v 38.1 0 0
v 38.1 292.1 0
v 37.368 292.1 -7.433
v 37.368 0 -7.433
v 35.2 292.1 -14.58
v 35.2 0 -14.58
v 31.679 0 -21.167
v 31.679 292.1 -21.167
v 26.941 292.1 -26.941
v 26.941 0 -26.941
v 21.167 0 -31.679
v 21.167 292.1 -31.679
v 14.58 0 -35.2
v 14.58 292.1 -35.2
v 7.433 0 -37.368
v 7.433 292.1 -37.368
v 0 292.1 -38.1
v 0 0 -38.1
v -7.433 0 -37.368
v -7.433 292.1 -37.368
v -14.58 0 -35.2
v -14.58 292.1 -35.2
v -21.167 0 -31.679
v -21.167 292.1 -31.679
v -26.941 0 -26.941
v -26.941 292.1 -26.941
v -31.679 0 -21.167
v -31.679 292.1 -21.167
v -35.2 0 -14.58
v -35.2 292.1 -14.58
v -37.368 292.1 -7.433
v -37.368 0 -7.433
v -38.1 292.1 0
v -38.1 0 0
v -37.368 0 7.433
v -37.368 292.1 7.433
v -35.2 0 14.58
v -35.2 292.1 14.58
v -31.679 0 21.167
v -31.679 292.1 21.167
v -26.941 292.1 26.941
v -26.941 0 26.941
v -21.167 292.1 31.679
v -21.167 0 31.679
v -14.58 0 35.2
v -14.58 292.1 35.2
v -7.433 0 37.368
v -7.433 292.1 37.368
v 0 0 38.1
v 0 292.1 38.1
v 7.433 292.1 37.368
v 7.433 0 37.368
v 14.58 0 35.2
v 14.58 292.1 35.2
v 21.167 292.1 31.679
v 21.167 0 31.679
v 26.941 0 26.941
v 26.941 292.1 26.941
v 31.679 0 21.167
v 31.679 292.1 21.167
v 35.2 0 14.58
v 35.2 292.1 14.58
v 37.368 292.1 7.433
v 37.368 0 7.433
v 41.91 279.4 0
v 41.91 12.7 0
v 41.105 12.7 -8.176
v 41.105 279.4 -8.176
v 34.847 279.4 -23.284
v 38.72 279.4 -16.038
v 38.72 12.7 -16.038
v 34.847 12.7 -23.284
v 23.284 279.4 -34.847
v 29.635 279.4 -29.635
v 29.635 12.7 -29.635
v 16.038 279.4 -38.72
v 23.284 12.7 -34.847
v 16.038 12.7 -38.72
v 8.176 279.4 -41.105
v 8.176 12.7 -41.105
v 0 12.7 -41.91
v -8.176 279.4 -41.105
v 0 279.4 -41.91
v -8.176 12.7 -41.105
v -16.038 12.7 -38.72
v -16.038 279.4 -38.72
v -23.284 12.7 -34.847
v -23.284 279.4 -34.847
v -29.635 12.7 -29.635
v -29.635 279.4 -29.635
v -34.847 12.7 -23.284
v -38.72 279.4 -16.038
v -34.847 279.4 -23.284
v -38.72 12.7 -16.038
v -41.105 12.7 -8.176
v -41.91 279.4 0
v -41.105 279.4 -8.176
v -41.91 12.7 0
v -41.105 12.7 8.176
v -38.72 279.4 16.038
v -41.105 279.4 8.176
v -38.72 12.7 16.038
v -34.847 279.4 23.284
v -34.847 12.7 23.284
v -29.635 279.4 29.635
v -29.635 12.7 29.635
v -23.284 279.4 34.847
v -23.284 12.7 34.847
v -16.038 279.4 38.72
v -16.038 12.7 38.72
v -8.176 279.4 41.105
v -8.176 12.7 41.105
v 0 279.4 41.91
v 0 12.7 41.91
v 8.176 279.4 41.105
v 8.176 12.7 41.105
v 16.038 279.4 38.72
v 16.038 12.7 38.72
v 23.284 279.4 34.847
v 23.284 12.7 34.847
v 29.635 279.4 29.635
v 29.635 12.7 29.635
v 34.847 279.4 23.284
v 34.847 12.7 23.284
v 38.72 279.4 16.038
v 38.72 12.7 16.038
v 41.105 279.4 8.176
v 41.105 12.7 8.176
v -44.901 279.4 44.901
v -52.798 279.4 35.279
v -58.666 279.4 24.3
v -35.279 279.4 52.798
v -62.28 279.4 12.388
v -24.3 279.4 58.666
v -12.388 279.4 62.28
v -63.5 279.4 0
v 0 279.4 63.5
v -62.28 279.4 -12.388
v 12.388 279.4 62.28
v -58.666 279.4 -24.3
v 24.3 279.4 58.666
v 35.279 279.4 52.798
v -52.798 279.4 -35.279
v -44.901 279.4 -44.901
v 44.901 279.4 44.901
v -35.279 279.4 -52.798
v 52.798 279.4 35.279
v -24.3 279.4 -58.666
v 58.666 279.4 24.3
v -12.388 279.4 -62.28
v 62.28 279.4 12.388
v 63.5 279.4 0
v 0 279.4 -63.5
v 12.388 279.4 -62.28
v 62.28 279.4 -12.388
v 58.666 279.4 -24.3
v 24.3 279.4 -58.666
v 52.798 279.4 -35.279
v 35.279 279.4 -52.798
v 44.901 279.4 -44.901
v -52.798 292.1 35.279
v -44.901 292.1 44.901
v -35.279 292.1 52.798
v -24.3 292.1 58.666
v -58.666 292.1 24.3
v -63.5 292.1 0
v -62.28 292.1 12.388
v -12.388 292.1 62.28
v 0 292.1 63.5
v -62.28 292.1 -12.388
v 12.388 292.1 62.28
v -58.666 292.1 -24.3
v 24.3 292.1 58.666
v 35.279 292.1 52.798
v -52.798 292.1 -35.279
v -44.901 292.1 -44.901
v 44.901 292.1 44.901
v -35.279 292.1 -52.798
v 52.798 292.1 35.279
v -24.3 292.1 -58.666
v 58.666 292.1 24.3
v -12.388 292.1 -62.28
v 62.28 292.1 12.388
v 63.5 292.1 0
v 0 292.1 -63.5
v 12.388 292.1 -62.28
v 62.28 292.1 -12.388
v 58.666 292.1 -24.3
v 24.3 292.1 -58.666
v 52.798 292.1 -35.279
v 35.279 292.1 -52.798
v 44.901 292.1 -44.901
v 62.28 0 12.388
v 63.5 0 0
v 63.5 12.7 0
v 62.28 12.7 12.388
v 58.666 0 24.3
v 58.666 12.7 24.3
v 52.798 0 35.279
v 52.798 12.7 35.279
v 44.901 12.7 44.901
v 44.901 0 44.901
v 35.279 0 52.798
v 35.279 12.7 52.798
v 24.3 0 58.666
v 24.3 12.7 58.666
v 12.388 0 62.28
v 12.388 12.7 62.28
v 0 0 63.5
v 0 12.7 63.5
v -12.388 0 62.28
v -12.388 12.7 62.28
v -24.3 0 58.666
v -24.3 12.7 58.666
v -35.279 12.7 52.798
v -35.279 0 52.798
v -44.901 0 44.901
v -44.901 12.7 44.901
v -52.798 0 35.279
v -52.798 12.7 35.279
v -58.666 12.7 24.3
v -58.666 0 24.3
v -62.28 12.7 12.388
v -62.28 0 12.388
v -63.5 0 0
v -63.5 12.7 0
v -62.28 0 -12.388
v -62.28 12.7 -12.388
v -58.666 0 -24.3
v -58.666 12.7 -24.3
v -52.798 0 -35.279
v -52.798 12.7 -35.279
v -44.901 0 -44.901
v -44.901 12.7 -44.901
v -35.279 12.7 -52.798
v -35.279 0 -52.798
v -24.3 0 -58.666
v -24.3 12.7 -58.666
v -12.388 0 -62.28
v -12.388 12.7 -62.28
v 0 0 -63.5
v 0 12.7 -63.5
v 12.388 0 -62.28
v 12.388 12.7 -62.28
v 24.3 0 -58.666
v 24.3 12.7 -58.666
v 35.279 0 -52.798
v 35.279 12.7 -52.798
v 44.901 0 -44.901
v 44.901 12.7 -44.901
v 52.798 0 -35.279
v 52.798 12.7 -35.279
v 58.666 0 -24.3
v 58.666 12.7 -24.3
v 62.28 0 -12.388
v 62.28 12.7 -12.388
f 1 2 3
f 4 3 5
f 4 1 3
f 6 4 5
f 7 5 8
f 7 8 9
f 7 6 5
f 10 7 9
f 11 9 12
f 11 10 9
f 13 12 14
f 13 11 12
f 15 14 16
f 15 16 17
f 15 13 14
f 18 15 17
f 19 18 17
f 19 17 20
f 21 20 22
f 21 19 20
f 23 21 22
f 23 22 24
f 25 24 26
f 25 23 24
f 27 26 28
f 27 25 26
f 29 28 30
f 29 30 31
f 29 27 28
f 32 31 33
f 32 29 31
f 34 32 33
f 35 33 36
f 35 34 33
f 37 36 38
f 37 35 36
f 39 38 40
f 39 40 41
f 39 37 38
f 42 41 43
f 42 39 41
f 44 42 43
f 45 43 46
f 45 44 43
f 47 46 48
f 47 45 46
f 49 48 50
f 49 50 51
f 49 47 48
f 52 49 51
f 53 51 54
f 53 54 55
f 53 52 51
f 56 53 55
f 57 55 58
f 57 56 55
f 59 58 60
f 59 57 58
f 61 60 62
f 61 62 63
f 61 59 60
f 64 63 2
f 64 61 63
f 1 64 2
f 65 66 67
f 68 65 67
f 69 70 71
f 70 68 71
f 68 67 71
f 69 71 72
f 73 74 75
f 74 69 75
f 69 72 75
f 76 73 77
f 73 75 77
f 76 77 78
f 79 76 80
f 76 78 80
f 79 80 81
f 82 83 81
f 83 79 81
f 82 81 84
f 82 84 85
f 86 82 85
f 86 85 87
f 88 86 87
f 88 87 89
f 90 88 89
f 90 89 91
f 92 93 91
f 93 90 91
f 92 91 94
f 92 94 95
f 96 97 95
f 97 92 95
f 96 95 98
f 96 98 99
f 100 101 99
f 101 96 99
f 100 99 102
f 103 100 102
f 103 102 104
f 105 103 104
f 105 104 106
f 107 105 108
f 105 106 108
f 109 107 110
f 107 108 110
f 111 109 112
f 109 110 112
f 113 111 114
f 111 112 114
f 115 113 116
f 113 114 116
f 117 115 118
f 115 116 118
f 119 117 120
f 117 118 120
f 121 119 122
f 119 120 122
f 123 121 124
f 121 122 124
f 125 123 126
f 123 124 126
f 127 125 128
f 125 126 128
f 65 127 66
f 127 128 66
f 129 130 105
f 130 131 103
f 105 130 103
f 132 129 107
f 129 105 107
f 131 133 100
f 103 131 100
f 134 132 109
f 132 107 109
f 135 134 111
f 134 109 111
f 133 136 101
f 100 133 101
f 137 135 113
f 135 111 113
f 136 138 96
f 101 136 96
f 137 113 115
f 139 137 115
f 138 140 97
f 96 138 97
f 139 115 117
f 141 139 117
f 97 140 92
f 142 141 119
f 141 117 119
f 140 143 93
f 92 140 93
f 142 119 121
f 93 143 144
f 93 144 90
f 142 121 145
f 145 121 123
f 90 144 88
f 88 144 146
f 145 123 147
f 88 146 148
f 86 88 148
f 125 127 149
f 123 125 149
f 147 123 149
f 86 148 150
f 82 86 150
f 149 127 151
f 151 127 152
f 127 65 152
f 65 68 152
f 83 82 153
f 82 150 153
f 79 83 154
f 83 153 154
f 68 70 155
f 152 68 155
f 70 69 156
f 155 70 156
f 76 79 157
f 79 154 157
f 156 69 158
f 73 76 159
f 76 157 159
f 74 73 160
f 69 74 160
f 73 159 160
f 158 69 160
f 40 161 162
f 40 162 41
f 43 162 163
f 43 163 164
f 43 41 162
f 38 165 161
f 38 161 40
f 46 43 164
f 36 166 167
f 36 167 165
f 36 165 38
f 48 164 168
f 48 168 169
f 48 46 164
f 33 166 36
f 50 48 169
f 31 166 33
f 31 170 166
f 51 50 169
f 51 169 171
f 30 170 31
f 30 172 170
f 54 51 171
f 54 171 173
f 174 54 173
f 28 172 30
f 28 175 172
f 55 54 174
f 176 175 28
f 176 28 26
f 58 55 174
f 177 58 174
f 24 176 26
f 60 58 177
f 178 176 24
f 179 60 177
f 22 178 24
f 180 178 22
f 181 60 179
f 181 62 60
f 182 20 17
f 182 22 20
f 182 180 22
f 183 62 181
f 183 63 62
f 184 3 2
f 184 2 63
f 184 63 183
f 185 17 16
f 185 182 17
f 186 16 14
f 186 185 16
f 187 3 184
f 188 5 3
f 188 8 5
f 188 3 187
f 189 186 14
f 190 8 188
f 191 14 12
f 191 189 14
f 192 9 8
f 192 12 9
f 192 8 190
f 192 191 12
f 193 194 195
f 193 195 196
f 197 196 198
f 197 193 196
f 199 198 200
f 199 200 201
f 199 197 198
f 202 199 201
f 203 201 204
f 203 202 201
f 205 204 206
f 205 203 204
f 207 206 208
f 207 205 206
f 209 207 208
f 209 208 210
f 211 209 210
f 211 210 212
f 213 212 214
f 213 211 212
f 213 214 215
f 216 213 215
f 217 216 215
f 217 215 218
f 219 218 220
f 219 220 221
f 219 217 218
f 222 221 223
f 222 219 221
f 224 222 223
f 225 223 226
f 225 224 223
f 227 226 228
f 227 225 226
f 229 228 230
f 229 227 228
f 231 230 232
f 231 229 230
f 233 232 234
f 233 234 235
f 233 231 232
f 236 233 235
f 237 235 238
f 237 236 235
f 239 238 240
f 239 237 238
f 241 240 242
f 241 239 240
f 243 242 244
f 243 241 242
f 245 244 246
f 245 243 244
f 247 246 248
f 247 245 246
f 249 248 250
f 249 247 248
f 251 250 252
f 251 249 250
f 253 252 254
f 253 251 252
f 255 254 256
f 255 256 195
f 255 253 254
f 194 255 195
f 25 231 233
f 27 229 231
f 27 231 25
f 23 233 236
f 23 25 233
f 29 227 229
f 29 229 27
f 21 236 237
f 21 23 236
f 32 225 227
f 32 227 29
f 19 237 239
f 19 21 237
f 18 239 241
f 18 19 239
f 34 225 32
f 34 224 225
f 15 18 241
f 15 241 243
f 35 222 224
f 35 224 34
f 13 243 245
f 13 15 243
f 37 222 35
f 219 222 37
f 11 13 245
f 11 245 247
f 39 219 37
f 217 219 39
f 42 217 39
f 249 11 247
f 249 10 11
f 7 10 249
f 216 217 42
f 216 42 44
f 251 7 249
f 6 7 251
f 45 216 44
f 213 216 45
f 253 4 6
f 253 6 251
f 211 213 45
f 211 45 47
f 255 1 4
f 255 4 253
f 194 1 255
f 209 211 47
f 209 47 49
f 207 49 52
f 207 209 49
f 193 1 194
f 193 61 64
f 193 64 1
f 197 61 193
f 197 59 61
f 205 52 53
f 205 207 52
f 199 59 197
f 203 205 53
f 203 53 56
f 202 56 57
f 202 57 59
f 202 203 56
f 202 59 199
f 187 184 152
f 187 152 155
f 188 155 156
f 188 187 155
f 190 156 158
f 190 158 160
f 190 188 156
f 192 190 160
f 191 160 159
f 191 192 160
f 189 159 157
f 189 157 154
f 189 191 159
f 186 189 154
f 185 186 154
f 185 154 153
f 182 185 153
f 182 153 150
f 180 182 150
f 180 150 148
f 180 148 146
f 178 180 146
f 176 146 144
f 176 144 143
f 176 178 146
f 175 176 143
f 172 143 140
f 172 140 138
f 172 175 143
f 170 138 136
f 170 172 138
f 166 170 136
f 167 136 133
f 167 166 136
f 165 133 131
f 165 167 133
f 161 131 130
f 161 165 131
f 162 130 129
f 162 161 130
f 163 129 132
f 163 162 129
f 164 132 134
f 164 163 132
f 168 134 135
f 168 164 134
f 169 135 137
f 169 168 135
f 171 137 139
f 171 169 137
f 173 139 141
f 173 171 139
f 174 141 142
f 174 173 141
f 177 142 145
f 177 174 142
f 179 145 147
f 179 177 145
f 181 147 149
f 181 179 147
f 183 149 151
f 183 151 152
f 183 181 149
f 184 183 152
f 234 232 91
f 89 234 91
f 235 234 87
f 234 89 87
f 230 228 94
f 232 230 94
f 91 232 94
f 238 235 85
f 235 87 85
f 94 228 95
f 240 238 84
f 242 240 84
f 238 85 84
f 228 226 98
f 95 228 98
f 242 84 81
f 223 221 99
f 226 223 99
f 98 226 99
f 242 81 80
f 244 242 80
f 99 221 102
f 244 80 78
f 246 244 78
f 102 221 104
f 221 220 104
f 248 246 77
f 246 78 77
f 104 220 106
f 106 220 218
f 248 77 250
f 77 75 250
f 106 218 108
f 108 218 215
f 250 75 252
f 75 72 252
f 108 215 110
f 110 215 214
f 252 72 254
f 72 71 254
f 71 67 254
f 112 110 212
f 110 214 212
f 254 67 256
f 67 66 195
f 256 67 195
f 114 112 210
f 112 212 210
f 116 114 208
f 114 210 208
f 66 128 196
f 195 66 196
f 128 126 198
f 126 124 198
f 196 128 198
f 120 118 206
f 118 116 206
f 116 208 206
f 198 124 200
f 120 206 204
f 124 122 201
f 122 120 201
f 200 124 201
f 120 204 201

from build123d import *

# Parameters (mm, degrees)
SKETCH2_R            = 41.91
SKETCH2_R_2          = 38.1
BASE_CYLINDER_DEPTH  = 292.1
SKETCH3_R            = 63.5
SKETCH3_R_2          = 38.1
AFT_FLANGE_DEPTH     = 12.7
SKETCH4_R            = 63.5
SKETCH4_R_2          = 38.1
FORWARD_FLANGE_DEPTH = 12.7


with BuildPart() as part:
    # Sketch2 → Base Cylinder (new body)
    with BuildSketch(Plane(origin=(0, 0, 0), x_dir=(1, 0, 0), z_dir=(0, 1, 0))):
        Circle(SKETCH2_R)
        Circle(SKETCH2_R_2, mode=Mode.SUBTRACT)
    extrude(amount=BASE_CYLINDER_DEPTH)

    # Sketch3 → Aft Flange (add)
    with BuildSketch(Plane.XZ):
        Circle(SKETCH3_R)
        Circle(SKETCH3_R_2, mode=Mode.SUBTRACT)
    extrude(amount=-AFT_FLANGE_DEPTH)

    # Sketch4 → Forward Flange (add)
    with BuildSketch(Plane(origin=(0, 292.1, 0), x_dir=(1, 0, 0), z_dir=(0, 1, 0))):
        Circle(SKETCH4_R)
        Circle(SKETCH4_R_2, mode=Mode.SUBTRACT)
    extrude(amount=-FORWARD_FLANGE_DEPTH)


solid = part.part
